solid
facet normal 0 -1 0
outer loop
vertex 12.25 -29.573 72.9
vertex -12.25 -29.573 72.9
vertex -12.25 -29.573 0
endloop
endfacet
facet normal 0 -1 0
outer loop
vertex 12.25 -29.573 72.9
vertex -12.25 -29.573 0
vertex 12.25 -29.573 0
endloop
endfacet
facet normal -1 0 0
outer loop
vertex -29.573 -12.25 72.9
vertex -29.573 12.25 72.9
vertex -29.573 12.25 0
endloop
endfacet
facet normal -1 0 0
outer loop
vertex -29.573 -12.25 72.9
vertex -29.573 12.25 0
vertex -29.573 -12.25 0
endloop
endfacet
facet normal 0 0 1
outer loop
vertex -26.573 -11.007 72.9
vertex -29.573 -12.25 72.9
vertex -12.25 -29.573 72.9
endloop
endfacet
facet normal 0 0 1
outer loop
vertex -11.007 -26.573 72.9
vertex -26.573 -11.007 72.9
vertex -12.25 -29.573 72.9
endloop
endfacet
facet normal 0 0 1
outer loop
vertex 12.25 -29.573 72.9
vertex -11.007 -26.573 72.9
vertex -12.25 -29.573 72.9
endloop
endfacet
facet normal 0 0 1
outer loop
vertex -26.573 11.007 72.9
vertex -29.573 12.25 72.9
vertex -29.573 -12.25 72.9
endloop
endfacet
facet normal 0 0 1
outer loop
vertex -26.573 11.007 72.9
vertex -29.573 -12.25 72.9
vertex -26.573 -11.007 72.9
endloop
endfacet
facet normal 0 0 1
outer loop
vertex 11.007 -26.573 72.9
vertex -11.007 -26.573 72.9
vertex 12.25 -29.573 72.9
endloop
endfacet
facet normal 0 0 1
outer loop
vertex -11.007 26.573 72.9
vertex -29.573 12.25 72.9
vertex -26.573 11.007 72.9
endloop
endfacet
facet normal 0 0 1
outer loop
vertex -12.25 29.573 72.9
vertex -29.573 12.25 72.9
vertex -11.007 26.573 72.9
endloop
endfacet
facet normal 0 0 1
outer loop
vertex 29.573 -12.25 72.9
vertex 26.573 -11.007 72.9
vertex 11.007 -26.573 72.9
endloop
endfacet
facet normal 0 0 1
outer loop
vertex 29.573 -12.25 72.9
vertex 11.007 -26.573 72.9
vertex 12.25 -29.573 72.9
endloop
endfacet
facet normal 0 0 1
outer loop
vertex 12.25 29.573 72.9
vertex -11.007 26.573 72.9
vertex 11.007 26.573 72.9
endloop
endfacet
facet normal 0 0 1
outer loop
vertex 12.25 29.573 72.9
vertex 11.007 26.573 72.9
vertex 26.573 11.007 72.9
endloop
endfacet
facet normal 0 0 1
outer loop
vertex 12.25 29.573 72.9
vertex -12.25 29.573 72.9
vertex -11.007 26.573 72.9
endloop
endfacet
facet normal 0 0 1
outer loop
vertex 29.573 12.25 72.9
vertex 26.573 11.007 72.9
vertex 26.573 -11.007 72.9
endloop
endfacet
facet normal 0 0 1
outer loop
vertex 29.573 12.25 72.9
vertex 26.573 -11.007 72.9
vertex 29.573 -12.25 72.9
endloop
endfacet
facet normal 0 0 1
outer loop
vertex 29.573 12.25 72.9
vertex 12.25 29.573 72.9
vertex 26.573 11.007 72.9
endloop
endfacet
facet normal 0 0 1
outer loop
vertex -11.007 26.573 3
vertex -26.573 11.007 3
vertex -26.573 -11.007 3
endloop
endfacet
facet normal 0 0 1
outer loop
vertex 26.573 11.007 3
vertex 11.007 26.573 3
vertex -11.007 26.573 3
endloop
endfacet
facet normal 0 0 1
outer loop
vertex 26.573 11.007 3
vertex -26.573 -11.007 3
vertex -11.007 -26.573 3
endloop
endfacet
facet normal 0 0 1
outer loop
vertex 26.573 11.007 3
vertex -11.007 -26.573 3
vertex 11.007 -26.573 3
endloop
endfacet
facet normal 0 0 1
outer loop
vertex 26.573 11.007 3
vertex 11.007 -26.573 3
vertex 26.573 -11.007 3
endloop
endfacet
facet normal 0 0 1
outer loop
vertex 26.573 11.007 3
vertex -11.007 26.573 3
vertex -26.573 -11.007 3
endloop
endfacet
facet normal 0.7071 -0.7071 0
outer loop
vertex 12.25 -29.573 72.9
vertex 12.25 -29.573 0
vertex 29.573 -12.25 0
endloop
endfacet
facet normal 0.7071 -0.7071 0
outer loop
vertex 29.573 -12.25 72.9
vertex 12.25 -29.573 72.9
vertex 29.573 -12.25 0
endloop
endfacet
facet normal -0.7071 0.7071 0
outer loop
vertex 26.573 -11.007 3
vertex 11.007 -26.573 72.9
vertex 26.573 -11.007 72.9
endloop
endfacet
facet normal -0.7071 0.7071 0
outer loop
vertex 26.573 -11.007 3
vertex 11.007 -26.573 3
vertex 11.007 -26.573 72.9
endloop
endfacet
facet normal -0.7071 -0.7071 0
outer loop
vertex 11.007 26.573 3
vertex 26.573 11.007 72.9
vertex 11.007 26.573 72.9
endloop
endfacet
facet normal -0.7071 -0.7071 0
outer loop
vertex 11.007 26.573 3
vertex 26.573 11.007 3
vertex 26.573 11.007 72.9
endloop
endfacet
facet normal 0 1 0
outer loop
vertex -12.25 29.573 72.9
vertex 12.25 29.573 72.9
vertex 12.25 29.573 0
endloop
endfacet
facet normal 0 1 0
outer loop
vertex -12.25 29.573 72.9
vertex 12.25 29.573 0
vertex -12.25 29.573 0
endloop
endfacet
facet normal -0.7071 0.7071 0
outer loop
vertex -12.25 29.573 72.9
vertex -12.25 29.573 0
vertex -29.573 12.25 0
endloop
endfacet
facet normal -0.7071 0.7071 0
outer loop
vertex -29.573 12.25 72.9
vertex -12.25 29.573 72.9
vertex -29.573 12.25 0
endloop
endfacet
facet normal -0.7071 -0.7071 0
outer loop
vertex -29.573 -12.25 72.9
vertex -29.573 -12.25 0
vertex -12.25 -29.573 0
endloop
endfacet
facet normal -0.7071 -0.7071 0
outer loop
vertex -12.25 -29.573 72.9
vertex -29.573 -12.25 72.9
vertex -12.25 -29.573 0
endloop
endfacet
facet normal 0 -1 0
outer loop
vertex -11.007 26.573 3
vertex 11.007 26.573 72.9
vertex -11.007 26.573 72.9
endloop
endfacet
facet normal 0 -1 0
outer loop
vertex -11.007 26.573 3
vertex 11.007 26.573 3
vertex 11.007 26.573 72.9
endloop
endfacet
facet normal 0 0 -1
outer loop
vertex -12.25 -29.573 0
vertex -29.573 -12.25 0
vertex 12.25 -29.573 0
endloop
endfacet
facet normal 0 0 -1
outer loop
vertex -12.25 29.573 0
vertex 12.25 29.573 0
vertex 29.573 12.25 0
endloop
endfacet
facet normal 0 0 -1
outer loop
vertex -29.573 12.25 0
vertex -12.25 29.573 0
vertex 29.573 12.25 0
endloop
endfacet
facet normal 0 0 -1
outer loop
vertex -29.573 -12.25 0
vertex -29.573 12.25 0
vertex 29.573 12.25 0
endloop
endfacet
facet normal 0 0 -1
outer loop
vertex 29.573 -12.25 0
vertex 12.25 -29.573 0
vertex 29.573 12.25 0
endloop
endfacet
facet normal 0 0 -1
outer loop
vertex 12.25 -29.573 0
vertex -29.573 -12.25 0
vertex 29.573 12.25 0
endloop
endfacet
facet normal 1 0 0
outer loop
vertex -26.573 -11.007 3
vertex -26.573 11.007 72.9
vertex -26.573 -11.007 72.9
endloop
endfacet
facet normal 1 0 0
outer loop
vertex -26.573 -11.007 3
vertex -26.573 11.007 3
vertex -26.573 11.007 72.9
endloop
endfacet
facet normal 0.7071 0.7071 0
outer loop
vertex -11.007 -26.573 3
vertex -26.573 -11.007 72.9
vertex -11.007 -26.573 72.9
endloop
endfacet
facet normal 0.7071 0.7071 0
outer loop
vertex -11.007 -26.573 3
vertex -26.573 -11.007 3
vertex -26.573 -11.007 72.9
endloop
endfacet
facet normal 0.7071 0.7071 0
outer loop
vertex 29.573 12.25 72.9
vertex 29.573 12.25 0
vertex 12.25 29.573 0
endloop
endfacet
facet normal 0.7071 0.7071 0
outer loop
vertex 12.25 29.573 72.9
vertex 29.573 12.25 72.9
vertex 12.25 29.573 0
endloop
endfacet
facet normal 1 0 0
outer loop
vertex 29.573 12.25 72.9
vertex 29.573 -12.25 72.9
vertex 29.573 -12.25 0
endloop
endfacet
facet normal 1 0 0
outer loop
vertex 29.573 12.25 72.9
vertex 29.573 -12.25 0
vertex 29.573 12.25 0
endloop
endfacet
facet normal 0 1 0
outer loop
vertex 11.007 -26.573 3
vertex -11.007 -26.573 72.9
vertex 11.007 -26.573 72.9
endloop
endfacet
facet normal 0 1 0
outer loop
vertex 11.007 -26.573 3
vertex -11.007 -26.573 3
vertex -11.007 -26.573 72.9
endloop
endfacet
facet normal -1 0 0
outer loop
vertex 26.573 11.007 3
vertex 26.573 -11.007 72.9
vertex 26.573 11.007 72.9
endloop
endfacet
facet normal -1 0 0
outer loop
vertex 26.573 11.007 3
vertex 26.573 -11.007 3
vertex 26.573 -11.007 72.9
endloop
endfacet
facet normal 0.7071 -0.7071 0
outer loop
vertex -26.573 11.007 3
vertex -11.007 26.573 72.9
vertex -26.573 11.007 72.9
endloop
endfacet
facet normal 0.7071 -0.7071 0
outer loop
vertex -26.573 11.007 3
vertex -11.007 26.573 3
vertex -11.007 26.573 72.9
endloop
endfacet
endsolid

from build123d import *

# Parameters (mm, degrees)
F1_DEPTH = 72.9
F2_T     = -3


with BuildPart() as f1:
    # F0 (on Top) → F1 (new body)
    with BuildSketch(Plane.XY):
        Polygon((12.249669, 29.573318), (-12.249669, 29.573318), (-29.573318, 12.249669), (-29.573318, -12.249669), (-12.249669, -29.573318), (12.249669, -29.573318), (29.573318, -12.249669), (29.573318, 12.249669), align=None)
    extrude(amount=F1_DEPTH)

    # F2
    f2_openings = [f1.faces().sort_by_distance(p)[0] for p in [
        (0, 0, 72.9),
    ]]
    offset(amount=F2_T, openings=f2_openings)


solid = f1.part
